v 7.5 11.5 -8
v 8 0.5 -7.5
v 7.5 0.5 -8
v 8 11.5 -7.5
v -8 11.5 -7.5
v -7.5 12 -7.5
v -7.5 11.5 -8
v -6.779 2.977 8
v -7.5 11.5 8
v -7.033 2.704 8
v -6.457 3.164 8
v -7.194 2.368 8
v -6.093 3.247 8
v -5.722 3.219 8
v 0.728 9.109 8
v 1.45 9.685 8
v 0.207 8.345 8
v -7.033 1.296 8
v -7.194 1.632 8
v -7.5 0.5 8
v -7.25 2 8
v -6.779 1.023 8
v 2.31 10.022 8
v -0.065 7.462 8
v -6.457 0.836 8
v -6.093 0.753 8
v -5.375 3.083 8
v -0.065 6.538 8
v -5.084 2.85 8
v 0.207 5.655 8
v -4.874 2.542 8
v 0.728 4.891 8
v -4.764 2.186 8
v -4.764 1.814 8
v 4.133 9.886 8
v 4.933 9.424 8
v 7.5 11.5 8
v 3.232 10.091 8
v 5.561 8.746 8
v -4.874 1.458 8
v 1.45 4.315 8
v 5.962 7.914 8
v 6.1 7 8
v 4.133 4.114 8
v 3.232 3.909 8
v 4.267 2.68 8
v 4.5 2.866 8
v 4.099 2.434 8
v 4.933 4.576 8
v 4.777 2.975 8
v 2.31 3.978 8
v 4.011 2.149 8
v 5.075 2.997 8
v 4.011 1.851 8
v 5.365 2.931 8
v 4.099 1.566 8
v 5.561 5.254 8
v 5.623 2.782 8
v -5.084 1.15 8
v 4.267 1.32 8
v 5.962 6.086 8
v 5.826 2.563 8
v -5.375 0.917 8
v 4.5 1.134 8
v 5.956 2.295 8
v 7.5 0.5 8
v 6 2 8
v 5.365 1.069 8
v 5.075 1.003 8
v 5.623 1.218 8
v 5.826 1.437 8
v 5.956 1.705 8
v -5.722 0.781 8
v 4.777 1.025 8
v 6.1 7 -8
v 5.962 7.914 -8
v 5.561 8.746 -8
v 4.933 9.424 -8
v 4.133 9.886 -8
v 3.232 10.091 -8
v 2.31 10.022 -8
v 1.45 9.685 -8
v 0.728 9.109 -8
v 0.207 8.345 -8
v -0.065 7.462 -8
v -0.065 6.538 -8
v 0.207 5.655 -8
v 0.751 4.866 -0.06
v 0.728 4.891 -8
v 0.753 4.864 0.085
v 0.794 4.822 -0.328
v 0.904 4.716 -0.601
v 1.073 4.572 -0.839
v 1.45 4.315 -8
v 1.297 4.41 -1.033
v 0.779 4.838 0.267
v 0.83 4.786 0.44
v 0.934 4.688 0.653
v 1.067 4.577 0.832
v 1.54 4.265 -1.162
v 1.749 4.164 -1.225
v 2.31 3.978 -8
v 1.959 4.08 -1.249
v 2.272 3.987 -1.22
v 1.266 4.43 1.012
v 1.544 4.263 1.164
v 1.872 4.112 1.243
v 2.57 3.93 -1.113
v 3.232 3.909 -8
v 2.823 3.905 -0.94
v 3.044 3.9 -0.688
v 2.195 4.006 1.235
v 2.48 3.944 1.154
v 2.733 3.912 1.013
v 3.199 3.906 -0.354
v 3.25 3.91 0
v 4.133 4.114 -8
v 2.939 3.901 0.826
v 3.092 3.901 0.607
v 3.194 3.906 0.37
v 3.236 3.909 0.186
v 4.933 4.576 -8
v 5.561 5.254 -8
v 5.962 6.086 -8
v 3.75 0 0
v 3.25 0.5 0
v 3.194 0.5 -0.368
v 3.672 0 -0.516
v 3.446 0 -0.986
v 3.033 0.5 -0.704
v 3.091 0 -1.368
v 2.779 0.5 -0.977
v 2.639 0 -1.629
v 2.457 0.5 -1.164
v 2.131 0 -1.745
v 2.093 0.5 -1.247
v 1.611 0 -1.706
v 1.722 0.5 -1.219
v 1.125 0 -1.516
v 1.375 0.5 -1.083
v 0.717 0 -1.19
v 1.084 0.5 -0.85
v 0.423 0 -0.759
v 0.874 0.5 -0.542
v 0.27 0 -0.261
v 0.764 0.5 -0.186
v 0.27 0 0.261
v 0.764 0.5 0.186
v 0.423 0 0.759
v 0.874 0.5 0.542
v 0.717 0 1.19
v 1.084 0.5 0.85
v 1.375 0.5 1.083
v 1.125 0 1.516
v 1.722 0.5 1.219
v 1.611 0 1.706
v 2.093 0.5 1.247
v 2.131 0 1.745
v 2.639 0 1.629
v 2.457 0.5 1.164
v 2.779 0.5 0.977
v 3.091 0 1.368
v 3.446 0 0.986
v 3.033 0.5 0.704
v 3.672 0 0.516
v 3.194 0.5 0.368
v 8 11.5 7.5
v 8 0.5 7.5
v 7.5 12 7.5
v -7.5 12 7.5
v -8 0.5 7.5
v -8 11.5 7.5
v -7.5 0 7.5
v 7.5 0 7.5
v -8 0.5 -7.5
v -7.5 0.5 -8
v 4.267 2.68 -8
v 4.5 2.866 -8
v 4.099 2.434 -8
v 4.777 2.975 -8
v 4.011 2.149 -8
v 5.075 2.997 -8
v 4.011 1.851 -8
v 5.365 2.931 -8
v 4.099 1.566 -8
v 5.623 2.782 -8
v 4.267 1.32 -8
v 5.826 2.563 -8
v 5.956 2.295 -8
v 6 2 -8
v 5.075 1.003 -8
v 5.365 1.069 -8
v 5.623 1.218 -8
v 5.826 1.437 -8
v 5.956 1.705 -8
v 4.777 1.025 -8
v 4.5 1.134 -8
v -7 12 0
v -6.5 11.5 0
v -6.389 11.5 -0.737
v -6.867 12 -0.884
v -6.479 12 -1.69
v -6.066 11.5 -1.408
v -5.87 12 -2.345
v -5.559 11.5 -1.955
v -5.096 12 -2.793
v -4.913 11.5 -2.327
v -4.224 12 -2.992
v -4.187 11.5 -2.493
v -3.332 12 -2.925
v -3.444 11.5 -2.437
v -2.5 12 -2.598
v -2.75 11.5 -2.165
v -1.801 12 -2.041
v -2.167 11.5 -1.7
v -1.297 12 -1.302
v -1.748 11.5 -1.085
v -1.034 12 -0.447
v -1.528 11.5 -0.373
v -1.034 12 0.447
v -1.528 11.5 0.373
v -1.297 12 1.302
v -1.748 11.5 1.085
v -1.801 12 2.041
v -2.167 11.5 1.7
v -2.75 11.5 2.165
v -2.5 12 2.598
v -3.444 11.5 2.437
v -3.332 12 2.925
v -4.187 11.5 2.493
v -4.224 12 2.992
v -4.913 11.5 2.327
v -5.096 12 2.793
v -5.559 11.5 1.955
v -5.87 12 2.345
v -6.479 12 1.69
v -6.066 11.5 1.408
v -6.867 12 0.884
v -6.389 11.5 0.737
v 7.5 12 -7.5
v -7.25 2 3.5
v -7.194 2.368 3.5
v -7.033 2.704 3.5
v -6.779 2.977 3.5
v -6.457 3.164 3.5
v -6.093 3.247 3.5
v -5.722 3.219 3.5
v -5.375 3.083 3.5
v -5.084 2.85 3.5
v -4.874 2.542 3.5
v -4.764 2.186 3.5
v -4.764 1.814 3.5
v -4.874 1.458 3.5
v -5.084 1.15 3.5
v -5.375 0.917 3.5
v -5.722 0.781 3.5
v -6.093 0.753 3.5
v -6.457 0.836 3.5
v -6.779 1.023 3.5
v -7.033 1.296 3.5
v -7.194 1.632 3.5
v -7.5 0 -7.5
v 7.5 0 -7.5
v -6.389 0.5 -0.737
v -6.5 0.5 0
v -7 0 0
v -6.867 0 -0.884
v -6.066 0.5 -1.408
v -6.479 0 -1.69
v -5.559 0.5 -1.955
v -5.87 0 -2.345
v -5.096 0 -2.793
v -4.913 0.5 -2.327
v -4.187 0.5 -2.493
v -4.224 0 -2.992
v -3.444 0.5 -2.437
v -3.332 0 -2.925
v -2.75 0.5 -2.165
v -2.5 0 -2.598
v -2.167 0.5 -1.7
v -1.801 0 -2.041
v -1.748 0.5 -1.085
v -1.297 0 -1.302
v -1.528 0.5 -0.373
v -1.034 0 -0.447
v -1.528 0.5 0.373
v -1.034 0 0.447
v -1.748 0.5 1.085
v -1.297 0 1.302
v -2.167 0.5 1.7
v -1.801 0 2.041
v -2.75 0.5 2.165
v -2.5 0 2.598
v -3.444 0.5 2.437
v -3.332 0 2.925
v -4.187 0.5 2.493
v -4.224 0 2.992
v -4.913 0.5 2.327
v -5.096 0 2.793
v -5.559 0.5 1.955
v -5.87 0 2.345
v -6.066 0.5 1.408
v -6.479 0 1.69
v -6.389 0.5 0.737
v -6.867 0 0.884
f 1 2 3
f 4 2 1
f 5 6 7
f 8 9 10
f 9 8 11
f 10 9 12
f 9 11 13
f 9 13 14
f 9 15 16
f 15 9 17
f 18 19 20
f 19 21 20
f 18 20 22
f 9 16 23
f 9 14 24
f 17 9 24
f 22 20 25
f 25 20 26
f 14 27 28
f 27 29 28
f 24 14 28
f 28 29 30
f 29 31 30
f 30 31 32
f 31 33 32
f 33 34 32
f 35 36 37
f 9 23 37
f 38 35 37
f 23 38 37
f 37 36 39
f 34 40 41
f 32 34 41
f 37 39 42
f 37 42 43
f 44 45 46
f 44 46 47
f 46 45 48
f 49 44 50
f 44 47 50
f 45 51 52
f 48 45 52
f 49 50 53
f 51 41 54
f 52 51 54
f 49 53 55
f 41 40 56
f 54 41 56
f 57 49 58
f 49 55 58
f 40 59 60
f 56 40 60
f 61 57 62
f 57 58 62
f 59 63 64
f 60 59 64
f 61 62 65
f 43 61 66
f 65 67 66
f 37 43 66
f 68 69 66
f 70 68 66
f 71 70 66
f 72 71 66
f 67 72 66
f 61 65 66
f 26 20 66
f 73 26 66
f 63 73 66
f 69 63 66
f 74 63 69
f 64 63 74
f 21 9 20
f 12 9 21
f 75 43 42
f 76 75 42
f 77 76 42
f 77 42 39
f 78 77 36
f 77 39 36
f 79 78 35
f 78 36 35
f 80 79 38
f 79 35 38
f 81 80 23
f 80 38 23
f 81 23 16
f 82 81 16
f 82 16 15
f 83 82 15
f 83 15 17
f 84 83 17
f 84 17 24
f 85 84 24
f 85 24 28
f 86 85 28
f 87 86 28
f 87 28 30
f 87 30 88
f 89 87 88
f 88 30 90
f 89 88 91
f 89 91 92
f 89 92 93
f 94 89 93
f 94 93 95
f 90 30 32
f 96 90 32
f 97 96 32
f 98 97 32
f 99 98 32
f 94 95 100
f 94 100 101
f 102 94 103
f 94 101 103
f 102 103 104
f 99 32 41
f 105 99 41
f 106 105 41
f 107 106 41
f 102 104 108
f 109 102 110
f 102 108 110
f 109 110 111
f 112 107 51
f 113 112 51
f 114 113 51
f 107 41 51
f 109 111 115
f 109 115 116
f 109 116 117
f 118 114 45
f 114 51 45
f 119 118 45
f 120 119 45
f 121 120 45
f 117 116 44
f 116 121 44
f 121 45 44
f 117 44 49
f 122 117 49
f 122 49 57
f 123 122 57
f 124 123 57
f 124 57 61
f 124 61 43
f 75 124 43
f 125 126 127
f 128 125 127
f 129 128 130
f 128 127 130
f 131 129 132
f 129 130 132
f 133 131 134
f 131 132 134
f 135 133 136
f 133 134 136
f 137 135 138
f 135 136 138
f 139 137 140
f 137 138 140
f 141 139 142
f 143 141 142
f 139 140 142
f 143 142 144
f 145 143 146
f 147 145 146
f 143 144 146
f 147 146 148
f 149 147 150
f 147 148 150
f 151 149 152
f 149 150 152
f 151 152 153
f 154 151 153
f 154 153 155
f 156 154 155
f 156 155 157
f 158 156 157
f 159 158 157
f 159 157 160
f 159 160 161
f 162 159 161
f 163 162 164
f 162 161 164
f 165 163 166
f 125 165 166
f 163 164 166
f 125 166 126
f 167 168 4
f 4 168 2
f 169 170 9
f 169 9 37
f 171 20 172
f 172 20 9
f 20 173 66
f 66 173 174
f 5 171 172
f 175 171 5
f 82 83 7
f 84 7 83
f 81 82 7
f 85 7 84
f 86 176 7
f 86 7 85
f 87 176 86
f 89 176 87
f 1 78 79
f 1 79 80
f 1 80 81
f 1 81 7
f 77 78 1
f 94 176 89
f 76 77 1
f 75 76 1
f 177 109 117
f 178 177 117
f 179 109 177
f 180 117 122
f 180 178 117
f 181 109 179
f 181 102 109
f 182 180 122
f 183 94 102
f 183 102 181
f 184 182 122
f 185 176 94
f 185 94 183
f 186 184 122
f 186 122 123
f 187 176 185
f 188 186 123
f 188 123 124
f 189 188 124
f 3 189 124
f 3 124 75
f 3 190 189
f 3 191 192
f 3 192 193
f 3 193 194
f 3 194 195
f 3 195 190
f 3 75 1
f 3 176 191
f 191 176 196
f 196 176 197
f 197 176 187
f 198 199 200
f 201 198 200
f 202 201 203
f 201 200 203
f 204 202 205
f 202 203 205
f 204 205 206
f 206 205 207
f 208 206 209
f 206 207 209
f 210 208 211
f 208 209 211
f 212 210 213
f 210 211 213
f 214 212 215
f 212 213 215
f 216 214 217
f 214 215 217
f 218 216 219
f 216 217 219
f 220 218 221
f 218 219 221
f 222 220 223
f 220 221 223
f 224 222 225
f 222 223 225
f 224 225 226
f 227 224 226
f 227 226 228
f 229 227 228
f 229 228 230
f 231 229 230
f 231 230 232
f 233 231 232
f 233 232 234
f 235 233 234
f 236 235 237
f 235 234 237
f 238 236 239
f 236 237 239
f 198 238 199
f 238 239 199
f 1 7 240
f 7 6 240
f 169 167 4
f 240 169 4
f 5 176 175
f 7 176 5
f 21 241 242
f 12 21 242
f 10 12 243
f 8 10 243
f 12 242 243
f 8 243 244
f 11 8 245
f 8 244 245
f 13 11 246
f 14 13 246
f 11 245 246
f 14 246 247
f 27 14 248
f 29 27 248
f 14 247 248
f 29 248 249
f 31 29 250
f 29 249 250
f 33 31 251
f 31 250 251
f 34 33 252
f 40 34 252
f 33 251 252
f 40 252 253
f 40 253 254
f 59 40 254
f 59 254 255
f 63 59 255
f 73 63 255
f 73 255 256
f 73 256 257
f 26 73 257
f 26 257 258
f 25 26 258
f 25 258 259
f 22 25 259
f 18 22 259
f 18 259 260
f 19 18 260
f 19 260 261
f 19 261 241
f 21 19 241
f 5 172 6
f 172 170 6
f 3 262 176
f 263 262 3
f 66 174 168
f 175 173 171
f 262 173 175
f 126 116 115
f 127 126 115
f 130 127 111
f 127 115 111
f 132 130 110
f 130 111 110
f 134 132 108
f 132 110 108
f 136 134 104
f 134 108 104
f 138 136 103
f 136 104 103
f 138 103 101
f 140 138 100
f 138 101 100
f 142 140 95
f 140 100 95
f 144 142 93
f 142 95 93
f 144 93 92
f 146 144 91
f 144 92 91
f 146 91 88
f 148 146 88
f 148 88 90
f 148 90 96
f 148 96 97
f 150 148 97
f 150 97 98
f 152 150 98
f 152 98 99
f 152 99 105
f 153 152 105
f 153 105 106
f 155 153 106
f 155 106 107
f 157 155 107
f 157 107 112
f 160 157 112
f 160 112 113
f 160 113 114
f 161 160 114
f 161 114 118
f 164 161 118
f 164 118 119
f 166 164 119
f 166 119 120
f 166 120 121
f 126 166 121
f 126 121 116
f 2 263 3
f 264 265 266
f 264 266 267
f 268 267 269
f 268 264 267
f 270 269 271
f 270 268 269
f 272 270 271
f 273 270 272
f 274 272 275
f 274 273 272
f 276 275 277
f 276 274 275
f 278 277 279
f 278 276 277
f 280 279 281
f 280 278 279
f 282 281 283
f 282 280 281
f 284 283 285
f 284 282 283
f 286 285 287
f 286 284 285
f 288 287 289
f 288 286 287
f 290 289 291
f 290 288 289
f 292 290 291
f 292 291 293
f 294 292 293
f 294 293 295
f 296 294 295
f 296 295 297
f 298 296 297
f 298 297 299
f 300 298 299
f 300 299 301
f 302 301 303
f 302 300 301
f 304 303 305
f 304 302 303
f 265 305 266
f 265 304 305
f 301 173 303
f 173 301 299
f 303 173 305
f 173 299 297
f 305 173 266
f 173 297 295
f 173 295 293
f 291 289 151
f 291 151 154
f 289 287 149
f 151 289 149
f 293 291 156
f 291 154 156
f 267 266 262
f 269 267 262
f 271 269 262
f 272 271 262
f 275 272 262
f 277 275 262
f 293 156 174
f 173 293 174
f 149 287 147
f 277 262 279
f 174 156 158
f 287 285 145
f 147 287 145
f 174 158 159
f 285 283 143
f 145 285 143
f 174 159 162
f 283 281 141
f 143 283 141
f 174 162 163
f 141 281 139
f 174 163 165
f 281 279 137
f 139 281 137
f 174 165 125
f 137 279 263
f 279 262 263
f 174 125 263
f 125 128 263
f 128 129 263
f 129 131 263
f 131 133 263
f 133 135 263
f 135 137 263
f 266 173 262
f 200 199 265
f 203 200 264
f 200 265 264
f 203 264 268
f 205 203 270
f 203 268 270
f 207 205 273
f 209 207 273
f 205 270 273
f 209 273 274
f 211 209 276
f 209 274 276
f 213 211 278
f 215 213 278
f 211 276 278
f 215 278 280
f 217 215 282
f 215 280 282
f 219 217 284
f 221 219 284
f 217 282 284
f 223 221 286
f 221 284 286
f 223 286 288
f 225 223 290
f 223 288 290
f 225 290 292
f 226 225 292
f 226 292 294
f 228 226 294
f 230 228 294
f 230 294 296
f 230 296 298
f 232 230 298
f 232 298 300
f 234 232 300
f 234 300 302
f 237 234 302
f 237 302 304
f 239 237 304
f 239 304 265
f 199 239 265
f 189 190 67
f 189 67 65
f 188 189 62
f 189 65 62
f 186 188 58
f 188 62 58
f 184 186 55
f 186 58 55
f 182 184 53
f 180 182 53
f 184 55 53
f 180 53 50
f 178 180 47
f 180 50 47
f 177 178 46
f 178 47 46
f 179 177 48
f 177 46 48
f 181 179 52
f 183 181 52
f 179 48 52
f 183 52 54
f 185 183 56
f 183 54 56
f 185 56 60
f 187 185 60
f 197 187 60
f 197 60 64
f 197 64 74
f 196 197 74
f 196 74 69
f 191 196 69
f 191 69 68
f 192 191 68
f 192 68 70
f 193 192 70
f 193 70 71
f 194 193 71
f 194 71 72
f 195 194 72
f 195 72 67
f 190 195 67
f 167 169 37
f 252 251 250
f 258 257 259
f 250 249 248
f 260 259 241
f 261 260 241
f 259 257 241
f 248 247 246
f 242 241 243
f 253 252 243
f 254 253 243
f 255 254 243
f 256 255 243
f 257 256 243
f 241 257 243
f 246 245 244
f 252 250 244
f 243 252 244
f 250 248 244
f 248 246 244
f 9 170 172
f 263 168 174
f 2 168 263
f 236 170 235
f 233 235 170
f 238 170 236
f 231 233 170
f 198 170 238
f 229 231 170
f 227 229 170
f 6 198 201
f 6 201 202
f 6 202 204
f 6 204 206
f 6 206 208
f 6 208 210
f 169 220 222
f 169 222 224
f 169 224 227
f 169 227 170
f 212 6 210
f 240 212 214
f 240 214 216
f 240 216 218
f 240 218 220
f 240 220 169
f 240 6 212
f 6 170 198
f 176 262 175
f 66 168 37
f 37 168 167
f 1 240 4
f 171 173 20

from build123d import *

# Parameters (mm, degrees)
SKETCH1_W                       = 16
SKETCH1_H                       = 16
BOSS_EXTRUDE1_DEPTH             = 12
SKETCH2_R                       = 3.1
SKETCH2_R_2                     = 1
CUT_EXTRUDE1_DEPTH              = 17
F_2_5_2_5_DIAMETER_HOLE1_D      = 2.5
F_2_5_2_5_DIAMETER_HOLE1_DEPTH  = 4.5
TAP_DRILL_FOR_M6X1_0_TAP1_D     = 5
TAP_DRILL_FOR_M3X0_5_TAP1_D     = 2.5
TAP_DRILL_FOR_M3X0_5_TAP1_DEPTH = 6.999
TAP_DRILL_FOR_M3X0_5_TAP1_TIP   = 0.751075774
CHAMFER1_SIZE                   = 0.5


with BuildPart() as part:
    # Sketch1 → Boss-Extrude1 (new body)
    with BuildSketch(Plane(origin=(0, 0, 0), x_dir=(1, 0, 0), z_dir=(0, 1, 0))):
        Rectangle(SKETCH1_W, SKETCH1_H)
    extrude(amount=BOSS_EXTRUDE1_DEPTH)

    # Sketch2 → Cut-Extrude1 (cut, through all)
    with BuildSketch(Plane.XY.offset(8)):
        with Locations((3, 7)):
            Circle(SKETCH2_R)
        with Locations((5, 2)):
            Circle(SKETCH2_R_2)
    extrude(amount=-CUT_EXTRUDE1_DEPTH, mode=Mode.SUBTRACT)

    # Ø2.5 (2.5) Diameter Hole1
    with Locations(Plane.XY.offset(8)):
        with Locations((-6, 2)):
            Hole(F_2_5_2_5_DIAMETER_HOLE1_D / 2, depth=F_2_5_2_5_DIAMETER_HOLE1_DEPTH)

    # Tap Drill for M6x1.0 Tap1 (through all)
    with Locations(Plane(origin=(0, 12, 0), x_dir=(1, 0, 0), z_dir=(0, 1, 0))):
        with Locations((-4, 0)):
            Hole(TAP_DRILL_FOR_M6X1_0_TAP1_D / 2)

    # Tap Drill for M3x0.5 Tap1
    with Locations(Plane(origin=(0, 0, 0), x_dir=(-1, 0, 0), z_dir=(0, -1, 0))):
        with Locations((-2, 0)):
            Hole(TAP_DRILL_FOR_M3X0_5_TAP1_D / 2, depth=TAP_DRILL_FOR_M3X0_5_TAP1_DEPTH)
            with Locations((0, 0, -(TAP_DRILL_FOR_M3X0_5_TAP1_DEPTH + TAP_DRILL_FOR_M3X0_5_TAP1_TIP / 2))):  # 118° drill point
                Cone(0, TAP_DRILL_FOR_M3X0_5_TAP1_D / 2, TAP_DRILL_FOR_M3X0_5_TAP1_TIP, mode=Mode.SUBTRACT)

    # Chamfer1
    chamfer1_edges = [part.edges().sort_by_distance(p)[0] for p in [
        (0, 12, -8),
        (-8, 12, 0),
        (-1.5, 12, 0),
        (-1.5, 0, 0),
        (0.75, 0, 0),
        (0, 12, 8),
        (-8, 0, 0),
        (0, 0, -8),
        (8, 0, 0),
        (0, 0, 8),
        (8, 12, 0),
        (-8, 6, 8),
        (-8, 6, -8),
        (8, 6, -8),
        (8, 6, 8),
    ]]
    chamfer(chamfer1_edges, length=CHAMFER1_SIZE)


solid = part.part
